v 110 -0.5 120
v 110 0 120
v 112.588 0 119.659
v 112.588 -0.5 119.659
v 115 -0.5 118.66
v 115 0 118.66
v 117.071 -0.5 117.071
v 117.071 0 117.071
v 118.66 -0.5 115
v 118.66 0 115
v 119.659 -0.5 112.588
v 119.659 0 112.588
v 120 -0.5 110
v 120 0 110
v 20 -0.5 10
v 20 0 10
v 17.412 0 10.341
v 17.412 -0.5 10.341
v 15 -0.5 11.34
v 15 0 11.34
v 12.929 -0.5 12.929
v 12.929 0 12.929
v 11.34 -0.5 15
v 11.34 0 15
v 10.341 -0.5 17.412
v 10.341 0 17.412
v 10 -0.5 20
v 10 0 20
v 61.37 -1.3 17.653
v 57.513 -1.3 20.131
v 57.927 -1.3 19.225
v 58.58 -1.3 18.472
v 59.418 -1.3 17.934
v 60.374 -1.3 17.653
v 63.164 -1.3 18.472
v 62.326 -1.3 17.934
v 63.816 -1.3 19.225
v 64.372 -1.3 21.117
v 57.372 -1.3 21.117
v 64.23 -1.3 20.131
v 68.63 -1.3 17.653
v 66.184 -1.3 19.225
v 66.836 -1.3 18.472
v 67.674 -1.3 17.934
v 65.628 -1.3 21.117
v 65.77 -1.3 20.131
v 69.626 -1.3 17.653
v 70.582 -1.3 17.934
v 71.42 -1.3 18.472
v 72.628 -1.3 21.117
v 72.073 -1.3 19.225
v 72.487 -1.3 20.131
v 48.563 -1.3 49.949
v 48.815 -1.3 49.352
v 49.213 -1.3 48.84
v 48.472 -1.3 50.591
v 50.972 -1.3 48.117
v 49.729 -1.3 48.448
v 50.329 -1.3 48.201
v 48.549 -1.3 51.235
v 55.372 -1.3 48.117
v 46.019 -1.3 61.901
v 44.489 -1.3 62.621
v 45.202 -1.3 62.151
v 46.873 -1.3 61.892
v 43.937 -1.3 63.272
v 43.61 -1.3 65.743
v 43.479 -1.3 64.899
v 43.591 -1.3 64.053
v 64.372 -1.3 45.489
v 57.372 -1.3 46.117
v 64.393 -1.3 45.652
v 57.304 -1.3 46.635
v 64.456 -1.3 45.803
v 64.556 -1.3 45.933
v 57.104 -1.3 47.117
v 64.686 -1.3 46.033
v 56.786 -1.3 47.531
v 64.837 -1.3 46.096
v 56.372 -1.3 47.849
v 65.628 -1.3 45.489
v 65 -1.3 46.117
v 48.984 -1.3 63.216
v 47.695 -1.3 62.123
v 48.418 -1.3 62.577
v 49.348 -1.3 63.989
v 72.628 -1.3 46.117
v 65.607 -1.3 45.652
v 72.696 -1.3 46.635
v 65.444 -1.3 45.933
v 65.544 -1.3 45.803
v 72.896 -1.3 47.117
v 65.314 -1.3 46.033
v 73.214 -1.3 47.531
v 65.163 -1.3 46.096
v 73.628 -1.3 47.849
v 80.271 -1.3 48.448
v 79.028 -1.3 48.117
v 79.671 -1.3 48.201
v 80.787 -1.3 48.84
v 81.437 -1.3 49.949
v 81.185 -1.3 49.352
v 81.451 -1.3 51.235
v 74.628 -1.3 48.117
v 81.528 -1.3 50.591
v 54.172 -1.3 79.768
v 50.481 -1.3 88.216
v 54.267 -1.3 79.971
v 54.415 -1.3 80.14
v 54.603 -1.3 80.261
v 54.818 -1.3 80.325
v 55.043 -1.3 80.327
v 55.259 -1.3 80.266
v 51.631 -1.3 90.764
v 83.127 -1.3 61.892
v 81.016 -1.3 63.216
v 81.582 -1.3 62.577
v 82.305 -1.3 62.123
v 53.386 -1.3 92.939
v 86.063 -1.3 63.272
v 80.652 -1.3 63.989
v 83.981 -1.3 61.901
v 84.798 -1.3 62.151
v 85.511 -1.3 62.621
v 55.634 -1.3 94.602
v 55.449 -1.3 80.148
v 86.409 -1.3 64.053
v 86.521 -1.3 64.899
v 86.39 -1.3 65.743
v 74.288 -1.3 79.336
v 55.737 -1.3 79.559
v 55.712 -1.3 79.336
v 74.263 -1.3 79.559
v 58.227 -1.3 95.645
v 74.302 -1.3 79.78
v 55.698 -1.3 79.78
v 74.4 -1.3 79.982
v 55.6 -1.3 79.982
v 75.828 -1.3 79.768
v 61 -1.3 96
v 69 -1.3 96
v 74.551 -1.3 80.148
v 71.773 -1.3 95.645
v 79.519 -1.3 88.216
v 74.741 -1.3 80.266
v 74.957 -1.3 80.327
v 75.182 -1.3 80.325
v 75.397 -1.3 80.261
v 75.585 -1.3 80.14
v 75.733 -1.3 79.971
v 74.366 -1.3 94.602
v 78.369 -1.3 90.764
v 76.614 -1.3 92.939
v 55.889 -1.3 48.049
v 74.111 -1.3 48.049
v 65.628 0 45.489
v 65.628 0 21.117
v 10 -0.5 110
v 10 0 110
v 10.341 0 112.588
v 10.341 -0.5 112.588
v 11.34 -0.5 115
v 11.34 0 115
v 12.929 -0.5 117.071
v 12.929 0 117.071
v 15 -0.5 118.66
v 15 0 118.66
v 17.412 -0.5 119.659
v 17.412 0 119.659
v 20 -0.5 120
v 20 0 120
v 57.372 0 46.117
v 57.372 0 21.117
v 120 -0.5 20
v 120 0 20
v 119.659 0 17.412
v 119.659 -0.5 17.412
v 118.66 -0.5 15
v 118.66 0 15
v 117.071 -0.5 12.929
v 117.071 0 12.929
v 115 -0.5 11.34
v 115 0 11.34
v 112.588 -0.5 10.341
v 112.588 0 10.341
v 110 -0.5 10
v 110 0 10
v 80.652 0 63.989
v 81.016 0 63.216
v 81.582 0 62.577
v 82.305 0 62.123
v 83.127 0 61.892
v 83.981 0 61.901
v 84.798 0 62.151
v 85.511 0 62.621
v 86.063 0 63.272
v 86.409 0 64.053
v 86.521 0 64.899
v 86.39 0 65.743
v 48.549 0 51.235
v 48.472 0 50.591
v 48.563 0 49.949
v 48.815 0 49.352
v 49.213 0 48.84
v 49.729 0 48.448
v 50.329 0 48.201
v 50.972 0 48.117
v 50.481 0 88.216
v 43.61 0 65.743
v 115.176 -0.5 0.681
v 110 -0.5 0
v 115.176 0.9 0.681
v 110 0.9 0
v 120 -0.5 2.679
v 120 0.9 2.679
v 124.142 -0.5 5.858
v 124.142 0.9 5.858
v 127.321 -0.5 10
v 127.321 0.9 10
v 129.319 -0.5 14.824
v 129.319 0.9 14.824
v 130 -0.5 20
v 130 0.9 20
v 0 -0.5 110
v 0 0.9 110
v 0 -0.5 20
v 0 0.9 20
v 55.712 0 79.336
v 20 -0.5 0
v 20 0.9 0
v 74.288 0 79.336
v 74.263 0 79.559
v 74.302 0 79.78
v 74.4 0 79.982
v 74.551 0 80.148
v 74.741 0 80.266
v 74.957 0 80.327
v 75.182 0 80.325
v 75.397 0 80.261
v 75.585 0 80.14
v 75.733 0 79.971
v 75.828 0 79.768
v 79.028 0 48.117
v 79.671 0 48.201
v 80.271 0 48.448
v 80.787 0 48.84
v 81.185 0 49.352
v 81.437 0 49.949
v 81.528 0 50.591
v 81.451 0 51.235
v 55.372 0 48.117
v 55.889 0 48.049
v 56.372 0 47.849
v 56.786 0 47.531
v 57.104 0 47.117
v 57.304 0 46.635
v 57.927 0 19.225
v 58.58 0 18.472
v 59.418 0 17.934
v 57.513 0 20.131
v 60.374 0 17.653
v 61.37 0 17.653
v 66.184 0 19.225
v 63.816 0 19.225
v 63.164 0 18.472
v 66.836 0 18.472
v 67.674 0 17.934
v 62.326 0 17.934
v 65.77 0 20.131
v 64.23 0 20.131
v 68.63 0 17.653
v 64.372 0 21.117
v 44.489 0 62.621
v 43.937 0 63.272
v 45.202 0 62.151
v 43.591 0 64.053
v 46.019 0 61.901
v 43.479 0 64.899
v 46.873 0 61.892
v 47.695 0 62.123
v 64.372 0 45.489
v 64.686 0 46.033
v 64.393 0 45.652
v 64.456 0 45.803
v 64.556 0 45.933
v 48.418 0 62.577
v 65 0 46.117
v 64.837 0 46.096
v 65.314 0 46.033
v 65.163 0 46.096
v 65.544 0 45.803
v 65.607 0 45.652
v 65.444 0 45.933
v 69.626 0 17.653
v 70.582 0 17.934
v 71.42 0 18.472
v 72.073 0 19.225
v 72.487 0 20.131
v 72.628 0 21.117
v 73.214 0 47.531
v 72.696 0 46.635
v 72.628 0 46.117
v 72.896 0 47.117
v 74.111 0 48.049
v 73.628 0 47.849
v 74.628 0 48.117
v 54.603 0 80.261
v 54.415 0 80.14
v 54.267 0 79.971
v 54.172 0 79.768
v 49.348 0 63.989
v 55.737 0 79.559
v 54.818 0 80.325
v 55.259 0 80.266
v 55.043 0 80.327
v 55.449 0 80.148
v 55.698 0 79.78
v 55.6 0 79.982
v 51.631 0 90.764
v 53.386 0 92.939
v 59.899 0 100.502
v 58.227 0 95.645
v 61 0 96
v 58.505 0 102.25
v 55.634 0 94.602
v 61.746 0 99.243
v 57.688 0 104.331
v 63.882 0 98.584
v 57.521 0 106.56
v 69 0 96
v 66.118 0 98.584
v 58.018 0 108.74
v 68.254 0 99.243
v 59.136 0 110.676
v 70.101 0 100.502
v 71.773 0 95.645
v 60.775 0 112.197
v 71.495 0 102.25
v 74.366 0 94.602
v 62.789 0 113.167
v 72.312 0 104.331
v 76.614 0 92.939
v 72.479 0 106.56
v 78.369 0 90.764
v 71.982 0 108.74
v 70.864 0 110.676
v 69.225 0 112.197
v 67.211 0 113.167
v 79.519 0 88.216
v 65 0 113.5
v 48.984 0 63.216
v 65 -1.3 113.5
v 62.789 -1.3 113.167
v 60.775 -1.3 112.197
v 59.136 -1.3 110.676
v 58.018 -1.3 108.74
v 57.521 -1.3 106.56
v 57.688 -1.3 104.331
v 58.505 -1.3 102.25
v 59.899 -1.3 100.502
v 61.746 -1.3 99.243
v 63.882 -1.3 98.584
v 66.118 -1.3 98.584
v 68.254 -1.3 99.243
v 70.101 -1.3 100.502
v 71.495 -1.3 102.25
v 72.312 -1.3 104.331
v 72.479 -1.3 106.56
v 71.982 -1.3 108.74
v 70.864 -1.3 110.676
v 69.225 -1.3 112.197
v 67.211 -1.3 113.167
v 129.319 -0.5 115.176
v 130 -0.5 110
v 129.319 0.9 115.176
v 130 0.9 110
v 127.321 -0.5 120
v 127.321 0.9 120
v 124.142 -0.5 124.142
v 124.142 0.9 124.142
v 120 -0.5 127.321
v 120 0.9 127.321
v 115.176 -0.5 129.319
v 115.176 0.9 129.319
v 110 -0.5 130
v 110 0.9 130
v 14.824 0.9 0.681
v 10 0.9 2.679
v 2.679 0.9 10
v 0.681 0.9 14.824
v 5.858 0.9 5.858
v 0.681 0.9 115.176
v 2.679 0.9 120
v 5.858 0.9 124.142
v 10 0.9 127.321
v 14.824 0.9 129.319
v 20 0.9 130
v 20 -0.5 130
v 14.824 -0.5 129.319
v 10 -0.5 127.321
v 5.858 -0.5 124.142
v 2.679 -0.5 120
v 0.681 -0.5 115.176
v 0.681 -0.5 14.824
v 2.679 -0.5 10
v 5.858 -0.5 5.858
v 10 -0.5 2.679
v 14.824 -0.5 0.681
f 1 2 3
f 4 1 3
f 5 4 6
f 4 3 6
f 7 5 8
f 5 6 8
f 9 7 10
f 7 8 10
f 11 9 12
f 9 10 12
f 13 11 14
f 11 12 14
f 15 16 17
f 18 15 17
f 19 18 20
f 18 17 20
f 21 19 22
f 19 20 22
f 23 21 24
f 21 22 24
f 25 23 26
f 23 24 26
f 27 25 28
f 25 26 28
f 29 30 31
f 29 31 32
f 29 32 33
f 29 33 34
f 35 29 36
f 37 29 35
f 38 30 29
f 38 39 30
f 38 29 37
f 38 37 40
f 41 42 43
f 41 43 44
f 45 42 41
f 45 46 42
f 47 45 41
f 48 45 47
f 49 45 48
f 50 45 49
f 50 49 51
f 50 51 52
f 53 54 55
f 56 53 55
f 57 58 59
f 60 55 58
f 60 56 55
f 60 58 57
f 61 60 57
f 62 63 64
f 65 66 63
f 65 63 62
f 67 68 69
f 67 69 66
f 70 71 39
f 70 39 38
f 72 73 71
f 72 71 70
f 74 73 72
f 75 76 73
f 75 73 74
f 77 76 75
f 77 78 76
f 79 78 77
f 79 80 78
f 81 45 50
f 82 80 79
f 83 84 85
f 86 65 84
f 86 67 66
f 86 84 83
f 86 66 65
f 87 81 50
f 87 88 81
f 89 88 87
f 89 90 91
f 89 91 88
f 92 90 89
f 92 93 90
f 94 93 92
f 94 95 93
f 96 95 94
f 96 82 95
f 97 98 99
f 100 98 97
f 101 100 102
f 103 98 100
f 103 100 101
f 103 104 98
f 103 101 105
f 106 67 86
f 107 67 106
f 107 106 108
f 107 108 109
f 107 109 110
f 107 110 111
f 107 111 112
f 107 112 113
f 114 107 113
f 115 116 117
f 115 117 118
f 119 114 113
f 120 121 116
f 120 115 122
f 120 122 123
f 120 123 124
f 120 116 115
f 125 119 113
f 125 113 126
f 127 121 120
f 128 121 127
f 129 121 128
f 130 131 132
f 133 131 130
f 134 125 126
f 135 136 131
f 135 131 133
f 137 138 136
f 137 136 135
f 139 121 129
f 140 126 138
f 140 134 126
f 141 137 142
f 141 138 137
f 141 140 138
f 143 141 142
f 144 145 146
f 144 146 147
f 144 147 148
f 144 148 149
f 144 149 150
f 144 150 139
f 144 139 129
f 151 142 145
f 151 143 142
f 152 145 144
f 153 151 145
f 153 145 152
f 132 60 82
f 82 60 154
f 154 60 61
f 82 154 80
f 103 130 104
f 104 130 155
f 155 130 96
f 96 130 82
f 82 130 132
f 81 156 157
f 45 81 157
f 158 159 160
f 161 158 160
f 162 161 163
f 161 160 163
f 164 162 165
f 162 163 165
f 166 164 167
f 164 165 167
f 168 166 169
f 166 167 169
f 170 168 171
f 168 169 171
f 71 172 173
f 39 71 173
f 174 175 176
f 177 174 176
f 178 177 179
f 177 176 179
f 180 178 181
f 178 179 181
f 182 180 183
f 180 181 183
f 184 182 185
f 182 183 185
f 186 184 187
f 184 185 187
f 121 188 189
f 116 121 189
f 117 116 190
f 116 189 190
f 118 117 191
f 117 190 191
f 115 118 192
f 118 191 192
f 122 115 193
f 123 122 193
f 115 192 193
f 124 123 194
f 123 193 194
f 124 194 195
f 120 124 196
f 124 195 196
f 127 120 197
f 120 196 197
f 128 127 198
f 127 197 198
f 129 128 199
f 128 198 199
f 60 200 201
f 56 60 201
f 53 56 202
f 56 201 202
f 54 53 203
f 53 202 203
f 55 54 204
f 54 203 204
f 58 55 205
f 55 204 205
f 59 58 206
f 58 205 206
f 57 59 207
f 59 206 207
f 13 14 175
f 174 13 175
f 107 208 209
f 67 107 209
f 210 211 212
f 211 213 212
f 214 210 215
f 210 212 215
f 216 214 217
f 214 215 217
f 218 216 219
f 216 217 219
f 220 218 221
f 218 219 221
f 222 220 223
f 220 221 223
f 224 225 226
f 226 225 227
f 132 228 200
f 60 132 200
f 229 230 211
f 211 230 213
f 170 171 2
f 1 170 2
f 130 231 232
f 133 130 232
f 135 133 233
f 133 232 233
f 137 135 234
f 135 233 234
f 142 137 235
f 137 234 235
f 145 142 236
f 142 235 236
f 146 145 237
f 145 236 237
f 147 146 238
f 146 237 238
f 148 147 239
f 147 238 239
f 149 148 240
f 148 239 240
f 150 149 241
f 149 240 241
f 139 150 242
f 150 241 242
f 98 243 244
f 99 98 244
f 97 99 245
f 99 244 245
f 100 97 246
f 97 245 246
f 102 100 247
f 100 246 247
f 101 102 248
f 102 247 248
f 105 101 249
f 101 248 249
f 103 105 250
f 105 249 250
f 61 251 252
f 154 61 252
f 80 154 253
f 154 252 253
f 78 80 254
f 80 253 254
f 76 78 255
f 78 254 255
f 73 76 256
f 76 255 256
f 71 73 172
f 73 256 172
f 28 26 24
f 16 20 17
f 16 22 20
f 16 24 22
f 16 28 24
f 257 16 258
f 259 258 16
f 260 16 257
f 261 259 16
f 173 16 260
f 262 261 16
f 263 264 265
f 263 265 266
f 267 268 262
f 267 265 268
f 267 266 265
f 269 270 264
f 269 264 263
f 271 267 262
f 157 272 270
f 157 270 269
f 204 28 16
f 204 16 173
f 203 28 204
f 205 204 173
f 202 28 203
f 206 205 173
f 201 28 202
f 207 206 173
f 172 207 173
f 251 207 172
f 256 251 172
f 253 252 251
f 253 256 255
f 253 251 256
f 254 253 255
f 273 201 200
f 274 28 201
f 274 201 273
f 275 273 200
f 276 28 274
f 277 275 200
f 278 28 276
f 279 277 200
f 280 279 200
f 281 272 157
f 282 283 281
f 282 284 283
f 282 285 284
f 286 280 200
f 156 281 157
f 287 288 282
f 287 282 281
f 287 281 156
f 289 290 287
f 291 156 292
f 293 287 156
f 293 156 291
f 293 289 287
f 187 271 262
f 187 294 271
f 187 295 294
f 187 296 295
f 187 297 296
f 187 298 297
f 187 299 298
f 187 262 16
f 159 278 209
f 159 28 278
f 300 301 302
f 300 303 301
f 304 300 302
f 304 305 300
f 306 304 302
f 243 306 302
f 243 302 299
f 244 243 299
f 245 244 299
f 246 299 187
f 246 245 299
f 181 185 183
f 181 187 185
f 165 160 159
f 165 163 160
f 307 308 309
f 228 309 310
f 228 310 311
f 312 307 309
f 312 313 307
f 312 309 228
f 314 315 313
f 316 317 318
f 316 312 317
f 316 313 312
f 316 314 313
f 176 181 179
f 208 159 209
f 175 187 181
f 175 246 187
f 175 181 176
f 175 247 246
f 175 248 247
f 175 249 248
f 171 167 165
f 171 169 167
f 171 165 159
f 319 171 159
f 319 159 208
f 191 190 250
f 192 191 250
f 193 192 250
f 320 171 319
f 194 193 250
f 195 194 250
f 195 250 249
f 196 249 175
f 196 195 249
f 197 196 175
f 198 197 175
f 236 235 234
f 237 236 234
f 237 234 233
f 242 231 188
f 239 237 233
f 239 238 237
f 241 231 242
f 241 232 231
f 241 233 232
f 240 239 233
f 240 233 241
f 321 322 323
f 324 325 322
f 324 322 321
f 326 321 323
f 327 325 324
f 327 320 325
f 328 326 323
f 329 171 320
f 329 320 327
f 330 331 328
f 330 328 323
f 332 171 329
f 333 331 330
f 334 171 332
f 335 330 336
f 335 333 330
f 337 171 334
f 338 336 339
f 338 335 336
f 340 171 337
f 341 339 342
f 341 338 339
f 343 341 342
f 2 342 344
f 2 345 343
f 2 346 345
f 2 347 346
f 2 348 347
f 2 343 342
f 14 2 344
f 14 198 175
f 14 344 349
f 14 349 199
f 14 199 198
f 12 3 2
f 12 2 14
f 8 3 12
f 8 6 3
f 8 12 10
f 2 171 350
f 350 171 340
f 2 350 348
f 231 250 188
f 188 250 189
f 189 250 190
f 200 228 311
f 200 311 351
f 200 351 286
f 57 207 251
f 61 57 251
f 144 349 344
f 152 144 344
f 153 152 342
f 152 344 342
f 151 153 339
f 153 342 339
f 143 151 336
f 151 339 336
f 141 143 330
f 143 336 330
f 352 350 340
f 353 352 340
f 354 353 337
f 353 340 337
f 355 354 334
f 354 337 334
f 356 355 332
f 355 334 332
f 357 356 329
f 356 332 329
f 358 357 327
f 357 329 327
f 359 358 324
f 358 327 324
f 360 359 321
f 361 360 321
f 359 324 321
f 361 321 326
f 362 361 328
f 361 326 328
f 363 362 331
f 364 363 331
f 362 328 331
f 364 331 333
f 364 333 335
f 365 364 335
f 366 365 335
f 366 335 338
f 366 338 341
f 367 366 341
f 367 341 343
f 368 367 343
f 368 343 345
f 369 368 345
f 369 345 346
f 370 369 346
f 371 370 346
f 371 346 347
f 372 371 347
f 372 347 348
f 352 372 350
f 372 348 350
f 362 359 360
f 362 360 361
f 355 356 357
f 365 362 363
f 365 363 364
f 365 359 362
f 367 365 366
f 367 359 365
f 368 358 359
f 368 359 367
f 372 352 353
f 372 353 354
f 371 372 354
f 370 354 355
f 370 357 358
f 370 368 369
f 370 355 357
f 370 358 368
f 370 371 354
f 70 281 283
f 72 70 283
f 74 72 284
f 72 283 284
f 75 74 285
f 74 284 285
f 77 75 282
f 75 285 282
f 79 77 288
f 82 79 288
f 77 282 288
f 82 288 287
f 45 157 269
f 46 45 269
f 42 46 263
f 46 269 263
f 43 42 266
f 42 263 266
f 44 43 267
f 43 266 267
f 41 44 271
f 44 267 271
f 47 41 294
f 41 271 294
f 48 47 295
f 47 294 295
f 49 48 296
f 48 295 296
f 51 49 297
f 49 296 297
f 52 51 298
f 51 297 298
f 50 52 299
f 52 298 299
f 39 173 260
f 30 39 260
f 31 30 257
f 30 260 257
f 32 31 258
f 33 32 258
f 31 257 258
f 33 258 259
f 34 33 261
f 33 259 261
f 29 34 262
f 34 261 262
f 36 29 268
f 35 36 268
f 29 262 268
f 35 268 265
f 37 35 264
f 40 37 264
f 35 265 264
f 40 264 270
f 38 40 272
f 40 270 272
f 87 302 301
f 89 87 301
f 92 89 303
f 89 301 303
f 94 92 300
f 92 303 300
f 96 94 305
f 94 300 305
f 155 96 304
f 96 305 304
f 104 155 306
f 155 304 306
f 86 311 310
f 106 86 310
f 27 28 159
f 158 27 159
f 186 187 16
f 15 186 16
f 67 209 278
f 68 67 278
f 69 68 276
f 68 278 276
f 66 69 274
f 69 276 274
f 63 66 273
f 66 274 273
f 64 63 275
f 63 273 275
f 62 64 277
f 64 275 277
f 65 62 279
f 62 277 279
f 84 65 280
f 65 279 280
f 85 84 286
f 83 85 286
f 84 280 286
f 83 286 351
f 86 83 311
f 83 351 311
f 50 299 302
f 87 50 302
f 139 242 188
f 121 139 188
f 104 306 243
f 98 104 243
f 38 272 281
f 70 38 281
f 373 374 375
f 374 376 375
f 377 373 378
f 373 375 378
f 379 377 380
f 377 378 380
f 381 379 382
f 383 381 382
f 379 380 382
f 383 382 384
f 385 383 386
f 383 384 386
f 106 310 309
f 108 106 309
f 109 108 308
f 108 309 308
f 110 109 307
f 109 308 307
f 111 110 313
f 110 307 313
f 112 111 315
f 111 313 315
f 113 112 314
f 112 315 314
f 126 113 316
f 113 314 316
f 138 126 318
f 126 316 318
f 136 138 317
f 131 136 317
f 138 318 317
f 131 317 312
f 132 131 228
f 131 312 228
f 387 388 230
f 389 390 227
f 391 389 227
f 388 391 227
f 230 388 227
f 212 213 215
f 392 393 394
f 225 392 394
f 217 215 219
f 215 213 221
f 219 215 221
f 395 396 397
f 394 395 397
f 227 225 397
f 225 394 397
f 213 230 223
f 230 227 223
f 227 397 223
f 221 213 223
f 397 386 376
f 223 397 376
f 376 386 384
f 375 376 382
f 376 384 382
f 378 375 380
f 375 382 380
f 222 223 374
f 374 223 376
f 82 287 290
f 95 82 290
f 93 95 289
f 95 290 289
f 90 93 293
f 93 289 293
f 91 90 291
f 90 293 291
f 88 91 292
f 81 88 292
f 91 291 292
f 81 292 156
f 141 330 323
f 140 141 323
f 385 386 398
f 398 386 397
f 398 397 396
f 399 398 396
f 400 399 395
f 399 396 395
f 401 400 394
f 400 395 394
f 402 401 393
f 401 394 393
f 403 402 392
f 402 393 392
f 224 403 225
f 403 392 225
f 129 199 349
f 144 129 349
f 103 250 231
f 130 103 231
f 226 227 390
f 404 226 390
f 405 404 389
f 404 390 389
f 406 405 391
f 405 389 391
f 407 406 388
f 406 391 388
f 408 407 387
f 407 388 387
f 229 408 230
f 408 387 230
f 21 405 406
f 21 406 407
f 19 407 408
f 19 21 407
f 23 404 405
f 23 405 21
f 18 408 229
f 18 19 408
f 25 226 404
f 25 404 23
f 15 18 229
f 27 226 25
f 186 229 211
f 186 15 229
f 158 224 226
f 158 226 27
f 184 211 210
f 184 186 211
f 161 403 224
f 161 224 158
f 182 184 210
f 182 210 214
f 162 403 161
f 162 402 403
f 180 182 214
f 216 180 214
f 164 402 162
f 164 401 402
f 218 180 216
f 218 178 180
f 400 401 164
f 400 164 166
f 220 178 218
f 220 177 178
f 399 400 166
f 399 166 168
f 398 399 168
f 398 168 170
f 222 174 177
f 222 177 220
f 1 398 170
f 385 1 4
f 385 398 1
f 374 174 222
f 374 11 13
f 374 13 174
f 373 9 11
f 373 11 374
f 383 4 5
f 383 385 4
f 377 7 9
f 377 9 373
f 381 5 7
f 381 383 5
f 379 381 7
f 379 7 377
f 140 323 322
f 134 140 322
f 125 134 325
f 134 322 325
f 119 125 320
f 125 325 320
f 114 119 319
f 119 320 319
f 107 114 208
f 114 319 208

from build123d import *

# Parameters (mm, degrees)
F1_DEPTH = 0.9
F2_DEPTH = 0.5
F3_DEPTH = 1.3


with BuildPart() as f1:
    # F0 (on Front) → F1 (new body)
    with BuildSketch(Plane.XZ):
        with BuildLine():
            ThreePointArc((0, 20), (5.857864, 5.857864), (20, 0))
            Line((20, 0), (65, 0))
            Line((65, 0), (110, 0))
            ThreePointArc((110, 0), (124.142136, 5.857864), (130, 20))
            Line((130, 20), (130, 110))
            ThreePointArc((130, 110), (124.142136, 124.142136), (110, 130))
            Line((110, 130), (65, 130))
            Line((65, 130), (20, 130))
            ThreePointArc((20, 130), (5.857864, 124.142136), (0, 110))
            Line((0, 110), (0, 20))
        make_face()
        with BuildLine():
            Line((65, 120), (110, 120))
            ThreePointArc((110, 120), (117.071068, 117.071068), (120, 110))
            Line((120, 110), (120, 20))
            ThreePointArc((120, 20), (117.071068, 12.928932), (110, 10))
            Line((110, 10), (65, 10))
            Line((65, 10), (20, 10))
            ThreePointArc((20, 10), (12.928932, 12.928932), (10, 20))
            Line((10, 20), (10, 110))
            ThreePointArc((10, 110), (12.928932, 117.071068), (20, 120))
            Line((20, 120), (65, 120))
        make_face(mode=Mode.SUBTRACT)
        with BuildLine():
            ThreePointArc((120, 110), (117.071068, 117.071068), (110, 120))
            Line((110, 120), (65, 120))
            Line((65, 120), (20, 120))
            ThreePointArc((20, 120), (12.928932, 117.071068), (10, 110))
            Line((10, 110), (10, 20))
            ThreePointArc((10, 20), (12.928932, 12.928932), (20, 10))
            Line((20, 10), (65, 10))
            Line((65, 10), (110, 10))
            ThreePointArc((110, 10), (117.071068, 12.928932), (120, 20))
            Line((120, 20), (120, 110))
        make_face()
        with BuildLine():
            ThreePointArc((50.480648, 88.216089), (54.456949, 93.842425), (61, 96))
            Line((61, 96), (65, 96))
            Line((65, 96), (69, 96))
            ThreePointArc((69, 96), (75.543051, 93.842425), (79.519352, 88.216089))
            Line((79.519352, 88.216089), (86.390087, 65.742927))
            ThreePointArc((86.390087, 65.742927), (84.398288, 61.996898), (80.652259, 63.988697))
            Line((80.652259, 63.988697), (75.828126, 79.767725))
            ThreePointArc((75.828126, 79.767725), (74.847274, 80.30417), (74.287869, 79.336229))
            Line((74.287869, 79.336229), (81.450841, 51.234772))
            ThreePointArc((81.450841, 51.234772), (81.002351, 49.083284), (79.028301, 48.117275))
            Line((79.028301, 48.117275), (74.628301, 48.117275))
            ThreePointArc((74.628301, 48.117275), (73.214088, 47.531488), (72.628301, 46.117275))
            Line((72.628301, 46.117275), (72.628301, 21.117275))
            ThreePointArc((72.628301, 21.117275), (69.128301, 17.617275), (65.628301, 21.117275))
            Line((65.628301, 21.117275), (65.628301, 45.488974))
            ThreePointArc((65.628301, 45.488974), (65.444276, 45.93325), (65, 46.117275))
            ThreePointArc((65, 46.117275), (64.555724, 45.93325), (64.371699, 45.488974))
            Line((64.371699, 45.488974), (64.371699, 21.117275))
            ThreePointArc((64.371699, 21.117275), (60.871699, 17.617275), (57.371699, 21.117275))
            Line((57.371699, 21.117275), (57.371699, 46.117275))
            ThreePointArc((57.371699, 46.117275), (56.785912, 47.531488), (55.371699, 48.117275))
            Line((55.371699, 48.117275), (50.971699, 48.117275))
            ThreePointArc((50.971699, 48.117275), (48.997649, 49.083284), (48.549159, 51.234772))
            Line((48.549159, 51.234772), (55.712131, 79.336229))
            ThreePointArc((55.712131, 79.336229), (55.152726, 80.30417), (54.171874, 79.767725))
            Line((54.171874, 79.767725), (49.347741, 63.988697))
            ThreePointArc((49.347741, 63.988697), (45.601712, 61.996898), (43.609913, 65.742927))
            Line((43.609913, 65.742927), (50.480648, 88.216089))
        make_face(mode=Mode.SUBTRACT)
        with BuildLine():
            ThreePointArc((65, 98.5), (57.5, 106), (65, 113.5))
            ThreePointArc((65, 113.5), (72.5, 106), (65, 98.5))
        make_face(mode=Mode.SUBTRACT)
        with BuildLine():
            Line((65, 96), (61, 96))
            ThreePointArc((61, 96), (54.456949, 93.842425), (50.480648, 88.216089))
            Line((50.480648, 88.216089), (43.609913, 65.742927))
            ThreePointArc((43.609913, 65.742927), (45.601712, 61.996898), (49.347741, 63.988697))
            Line((49.347741, 63.988697), (54.171874, 79.767725))
            ThreePointArc((54.171874, 79.767725), (55.152726, 80.30417), (55.712131, 79.336229))
            Line((55.712131, 79.336229), (48.549159, 51.234772))
            ThreePointArc((48.549159, 51.234772), (48.997649, 49.083284), (50.971699, 48.117275))
            Line((50.971699, 48.117275), (55.371699, 48.117275))
            ThreePointArc((55.371699, 48.117275), (56.785912, 47.531488), (57.371699, 46.117275))
            Line((57.371699, 46.117275), (57.371699, 21.117275))
            ThreePointArc((57.371699, 21.117275), (60.871699, 17.617275), (64.371699, 21.117275))
            Line((64.371699, 21.117275), (64.371699, 45.488974))
            ThreePointArc((64.371699, 45.488974), (64.555724, 45.93325), (65, 46.117275))
            ThreePointArc((65, 46.117275), (65.444276, 45.93325), (65.628301, 45.488974))
            Line((65.628301, 45.488974), (65.628301, 21.117275))
            ThreePointArc((65.628301, 21.117275), (69.128301, 17.617275), (72.628301, 21.117275))
            Line((72.628301, 21.117275), (72.628301, 46.117275))
            ThreePointArc((72.628301, 46.117275), (73.214088, 47.531488), (74.628301, 48.117275))
            Line((74.628301, 48.117275), (79.028301, 48.117275))
            ThreePointArc((79.028301, 48.117275), (81.002351, 49.083284), (81.450841, 51.234772))
            Line((81.450841, 51.234772), (74.287869, 79.336229))
            ThreePointArc((74.287869, 79.336229), (74.847274, 80.30417), (75.828126, 79.767725))
            Line((75.828126, 79.767725), (80.652259, 63.988697))
            ThreePointArc((80.652259, 63.988697), (84.398288, 61.996898), (86.390087, 65.742927))
            Line((86.390087, 65.742927), (79.519352, 88.216089))
            ThreePointArc((79.519352, 88.216089), (75.543051, 93.842425), (69, 96))
            Line((69, 96), (65, 96))
        make_face()
        with BuildLine():
            ThreePointArc((65, 98.5), (72.5, 106), (65, 113.5))
            ThreePointArc((65, 113.5), (57.5, 106), (65, 98.5))
        make_face()
    extrude(amount=-F1_DEPTH)

    # F0 (on Front) → F2 (join)
    with BuildSketch(Plane.XZ):
        with BuildLine():
            ThreePointArc((0, 20), (5.857864, 5.857864), (20, 0))
            Line((20, 0), (65, 0))
            Line((65, 0), (110, 0))
            ThreePointArc((110, 0), (124.142136, 5.857864), (130, 20))
            Line((130, 20), (130, 110))
            ThreePointArc((130, 110), (124.142136, 124.142136), (110, 130))
            Line((110, 130), (65, 130))
            Line((65, 130), (20, 130))
            ThreePointArc((20, 130), (5.857864, 124.142136), (0, 110))
            Line((0, 110), (0, 20))
        make_face()
        with BuildLine():
            Line((65, 120), (110, 120))
            ThreePointArc((110, 120), (117.071068, 117.071068), (120, 110))
            Line((120, 110), (120, 20))
            ThreePointArc((120, 20), (117.071068, 12.928932), (110, 10))
            Line((110, 10), (65, 10))
            Line((65, 10), (20, 10))
            ThreePointArc((20, 10), (12.928932, 12.928932), (10, 20))
            Line((10, 20), (10, 110))
            ThreePointArc((10, 110), (12.928932, 117.071068), (20, 120))
            Line((20, 120), (65, 120))
        make_face(mode=Mode.SUBTRACT)
    extrude(amount=F2_DEPTH)

    # F0 (on Front) → F3 (join)
    with BuildSketch(Plane.XZ):
        with BuildLine():
            ThreePointArc((65, 98.5), (72.5, 106), (65, 113.5))
            ThreePointArc((65, 113.5), (57.5, 106), (65, 98.5))
        make_face()
        with BuildLine():
            Line((65, 96), (61, 96))
            ThreePointArc((61, 96), (54.456949, 93.842425), (50.480648, 88.216089))
            Line((50.480648, 88.216089), (43.609913, 65.742927))
            ThreePointArc((43.609913, 65.742927), (45.601712, 61.996898), (49.347741, 63.988697))
            Line((49.347741, 63.988697), (54.171874, 79.767725))
            ThreePointArc((54.171874, 79.767725), (55.152726, 80.30417), (55.712131, 79.336229))
            Line((55.712131, 79.336229), (48.549159, 51.234772))
            ThreePointArc((48.549159, 51.234772), (48.997649, 49.083284), (50.971699, 48.117275))
            Line((50.971699, 48.117275), (55.371699, 48.117275))
            ThreePointArc((55.371699, 48.117275), (56.785912, 47.531488), (57.371699, 46.117275))
            Line((57.371699, 46.117275), (57.371699, 21.117275))
            ThreePointArc((57.371699, 21.117275), (60.871699, 17.617275), (64.371699, 21.117275))
            Line((64.371699, 21.117275), (64.371699, 45.488974))
            ThreePointArc((64.371699, 45.488974), (64.555724, 45.93325), (65, 46.117275))
            ThreePointArc((65, 46.117275), (65.444276, 45.93325), (65.628301, 45.488974))
            Line((65.628301, 45.488974), (65.628301, 21.117275))
            ThreePointArc((65.628301, 21.117275), (69.128301, 17.617275), (72.628301, 21.117275))
            Line((72.628301, 21.117275), (72.628301, 46.117275))
            ThreePointArc((72.628301, 46.117275), (73.214088, 47.531488), (74.628301, 48.117275))
            Line((74.628301, 48.117275), (79.028301, 48.117275))
            ThreePointArc((79.028301, 48.117275), (81.002351, 49.083284), (81.450841, 51.234772))
            Line((81.450841, 51.234772), (74.287869, 79.336229))
            ThreePointArc((74.287869, 79.336229), (74.847274, 80.30417), (75.828126, 79.767725))
            Line((75.828126, 79.767725), (80.652259, 63.988697))
            ThreePointArc((80.652259, 63.988697), (84.398288, 61.996898), (86.390087, 65.742927))
            Line((86.390087, 65.742927), (79.519352, 88.216089))
            ThreePointArc((79.519352, 88.216089), (75.543051, 93.842425), (69, 96))
            Line((69, 96), (65, 96))
        make_face()
    extrude(amount=F3_DEPTH)


solid = f1.part
